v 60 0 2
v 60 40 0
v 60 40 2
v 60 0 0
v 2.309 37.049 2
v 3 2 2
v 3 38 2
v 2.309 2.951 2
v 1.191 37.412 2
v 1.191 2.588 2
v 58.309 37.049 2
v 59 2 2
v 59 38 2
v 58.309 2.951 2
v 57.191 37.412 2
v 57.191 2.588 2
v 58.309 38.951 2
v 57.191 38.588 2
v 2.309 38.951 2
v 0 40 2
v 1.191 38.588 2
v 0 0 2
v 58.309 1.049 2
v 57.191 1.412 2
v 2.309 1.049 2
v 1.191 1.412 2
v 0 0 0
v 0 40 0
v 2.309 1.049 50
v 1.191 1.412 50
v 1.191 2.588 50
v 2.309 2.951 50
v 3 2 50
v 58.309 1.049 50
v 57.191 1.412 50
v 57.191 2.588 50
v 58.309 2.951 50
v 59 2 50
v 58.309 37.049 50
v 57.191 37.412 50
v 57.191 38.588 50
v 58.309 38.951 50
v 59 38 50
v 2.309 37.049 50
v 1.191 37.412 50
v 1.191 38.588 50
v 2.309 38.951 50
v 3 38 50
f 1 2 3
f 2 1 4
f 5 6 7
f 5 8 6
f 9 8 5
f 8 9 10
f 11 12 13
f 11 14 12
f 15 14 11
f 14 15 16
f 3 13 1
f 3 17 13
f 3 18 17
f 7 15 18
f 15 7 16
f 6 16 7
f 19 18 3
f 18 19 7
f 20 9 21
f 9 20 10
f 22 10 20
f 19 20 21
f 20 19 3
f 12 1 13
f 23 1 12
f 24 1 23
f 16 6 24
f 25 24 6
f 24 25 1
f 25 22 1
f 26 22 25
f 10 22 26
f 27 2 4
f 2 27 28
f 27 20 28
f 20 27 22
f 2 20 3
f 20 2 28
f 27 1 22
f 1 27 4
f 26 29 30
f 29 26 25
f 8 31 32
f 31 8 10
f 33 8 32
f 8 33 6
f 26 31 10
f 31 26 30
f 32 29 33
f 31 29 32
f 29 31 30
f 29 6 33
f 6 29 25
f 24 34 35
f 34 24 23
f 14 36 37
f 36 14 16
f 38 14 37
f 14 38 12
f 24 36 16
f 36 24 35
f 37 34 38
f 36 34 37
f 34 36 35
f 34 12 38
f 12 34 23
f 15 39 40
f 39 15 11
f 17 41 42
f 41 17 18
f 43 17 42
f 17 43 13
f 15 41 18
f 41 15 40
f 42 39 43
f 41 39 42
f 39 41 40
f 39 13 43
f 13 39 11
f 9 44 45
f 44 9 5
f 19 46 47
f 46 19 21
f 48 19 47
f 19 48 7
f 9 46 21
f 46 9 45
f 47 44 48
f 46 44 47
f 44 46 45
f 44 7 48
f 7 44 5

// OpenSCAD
protoboardWidth = 60;
protoboardHeight = 40;
postHeight = 50;
postCornerOffset = 2;
postRadius = 1;
baseHeight = 2;


cube(size = [protoboardWidth, protoboardHeight, baseHeight]);
translate([postCornerOffset, postCornerOffset])
    cylinder(postHeight, postRadius, postRadius);
translate([protoboardWidth-postCornerOffset, postCornerOffset])
    cylinder(postHeight, postRadius, postRadius);
translate([protoboardWidth-postCornerOffset, protoboardHeight-postCornerOffset])
    cylinder(postHeight, postRadius, postRadius);
translate([postCornerOffset, protoboardHeight-postCornerOffset])
    cylinder(postHeight, postRadius, postRadius);
